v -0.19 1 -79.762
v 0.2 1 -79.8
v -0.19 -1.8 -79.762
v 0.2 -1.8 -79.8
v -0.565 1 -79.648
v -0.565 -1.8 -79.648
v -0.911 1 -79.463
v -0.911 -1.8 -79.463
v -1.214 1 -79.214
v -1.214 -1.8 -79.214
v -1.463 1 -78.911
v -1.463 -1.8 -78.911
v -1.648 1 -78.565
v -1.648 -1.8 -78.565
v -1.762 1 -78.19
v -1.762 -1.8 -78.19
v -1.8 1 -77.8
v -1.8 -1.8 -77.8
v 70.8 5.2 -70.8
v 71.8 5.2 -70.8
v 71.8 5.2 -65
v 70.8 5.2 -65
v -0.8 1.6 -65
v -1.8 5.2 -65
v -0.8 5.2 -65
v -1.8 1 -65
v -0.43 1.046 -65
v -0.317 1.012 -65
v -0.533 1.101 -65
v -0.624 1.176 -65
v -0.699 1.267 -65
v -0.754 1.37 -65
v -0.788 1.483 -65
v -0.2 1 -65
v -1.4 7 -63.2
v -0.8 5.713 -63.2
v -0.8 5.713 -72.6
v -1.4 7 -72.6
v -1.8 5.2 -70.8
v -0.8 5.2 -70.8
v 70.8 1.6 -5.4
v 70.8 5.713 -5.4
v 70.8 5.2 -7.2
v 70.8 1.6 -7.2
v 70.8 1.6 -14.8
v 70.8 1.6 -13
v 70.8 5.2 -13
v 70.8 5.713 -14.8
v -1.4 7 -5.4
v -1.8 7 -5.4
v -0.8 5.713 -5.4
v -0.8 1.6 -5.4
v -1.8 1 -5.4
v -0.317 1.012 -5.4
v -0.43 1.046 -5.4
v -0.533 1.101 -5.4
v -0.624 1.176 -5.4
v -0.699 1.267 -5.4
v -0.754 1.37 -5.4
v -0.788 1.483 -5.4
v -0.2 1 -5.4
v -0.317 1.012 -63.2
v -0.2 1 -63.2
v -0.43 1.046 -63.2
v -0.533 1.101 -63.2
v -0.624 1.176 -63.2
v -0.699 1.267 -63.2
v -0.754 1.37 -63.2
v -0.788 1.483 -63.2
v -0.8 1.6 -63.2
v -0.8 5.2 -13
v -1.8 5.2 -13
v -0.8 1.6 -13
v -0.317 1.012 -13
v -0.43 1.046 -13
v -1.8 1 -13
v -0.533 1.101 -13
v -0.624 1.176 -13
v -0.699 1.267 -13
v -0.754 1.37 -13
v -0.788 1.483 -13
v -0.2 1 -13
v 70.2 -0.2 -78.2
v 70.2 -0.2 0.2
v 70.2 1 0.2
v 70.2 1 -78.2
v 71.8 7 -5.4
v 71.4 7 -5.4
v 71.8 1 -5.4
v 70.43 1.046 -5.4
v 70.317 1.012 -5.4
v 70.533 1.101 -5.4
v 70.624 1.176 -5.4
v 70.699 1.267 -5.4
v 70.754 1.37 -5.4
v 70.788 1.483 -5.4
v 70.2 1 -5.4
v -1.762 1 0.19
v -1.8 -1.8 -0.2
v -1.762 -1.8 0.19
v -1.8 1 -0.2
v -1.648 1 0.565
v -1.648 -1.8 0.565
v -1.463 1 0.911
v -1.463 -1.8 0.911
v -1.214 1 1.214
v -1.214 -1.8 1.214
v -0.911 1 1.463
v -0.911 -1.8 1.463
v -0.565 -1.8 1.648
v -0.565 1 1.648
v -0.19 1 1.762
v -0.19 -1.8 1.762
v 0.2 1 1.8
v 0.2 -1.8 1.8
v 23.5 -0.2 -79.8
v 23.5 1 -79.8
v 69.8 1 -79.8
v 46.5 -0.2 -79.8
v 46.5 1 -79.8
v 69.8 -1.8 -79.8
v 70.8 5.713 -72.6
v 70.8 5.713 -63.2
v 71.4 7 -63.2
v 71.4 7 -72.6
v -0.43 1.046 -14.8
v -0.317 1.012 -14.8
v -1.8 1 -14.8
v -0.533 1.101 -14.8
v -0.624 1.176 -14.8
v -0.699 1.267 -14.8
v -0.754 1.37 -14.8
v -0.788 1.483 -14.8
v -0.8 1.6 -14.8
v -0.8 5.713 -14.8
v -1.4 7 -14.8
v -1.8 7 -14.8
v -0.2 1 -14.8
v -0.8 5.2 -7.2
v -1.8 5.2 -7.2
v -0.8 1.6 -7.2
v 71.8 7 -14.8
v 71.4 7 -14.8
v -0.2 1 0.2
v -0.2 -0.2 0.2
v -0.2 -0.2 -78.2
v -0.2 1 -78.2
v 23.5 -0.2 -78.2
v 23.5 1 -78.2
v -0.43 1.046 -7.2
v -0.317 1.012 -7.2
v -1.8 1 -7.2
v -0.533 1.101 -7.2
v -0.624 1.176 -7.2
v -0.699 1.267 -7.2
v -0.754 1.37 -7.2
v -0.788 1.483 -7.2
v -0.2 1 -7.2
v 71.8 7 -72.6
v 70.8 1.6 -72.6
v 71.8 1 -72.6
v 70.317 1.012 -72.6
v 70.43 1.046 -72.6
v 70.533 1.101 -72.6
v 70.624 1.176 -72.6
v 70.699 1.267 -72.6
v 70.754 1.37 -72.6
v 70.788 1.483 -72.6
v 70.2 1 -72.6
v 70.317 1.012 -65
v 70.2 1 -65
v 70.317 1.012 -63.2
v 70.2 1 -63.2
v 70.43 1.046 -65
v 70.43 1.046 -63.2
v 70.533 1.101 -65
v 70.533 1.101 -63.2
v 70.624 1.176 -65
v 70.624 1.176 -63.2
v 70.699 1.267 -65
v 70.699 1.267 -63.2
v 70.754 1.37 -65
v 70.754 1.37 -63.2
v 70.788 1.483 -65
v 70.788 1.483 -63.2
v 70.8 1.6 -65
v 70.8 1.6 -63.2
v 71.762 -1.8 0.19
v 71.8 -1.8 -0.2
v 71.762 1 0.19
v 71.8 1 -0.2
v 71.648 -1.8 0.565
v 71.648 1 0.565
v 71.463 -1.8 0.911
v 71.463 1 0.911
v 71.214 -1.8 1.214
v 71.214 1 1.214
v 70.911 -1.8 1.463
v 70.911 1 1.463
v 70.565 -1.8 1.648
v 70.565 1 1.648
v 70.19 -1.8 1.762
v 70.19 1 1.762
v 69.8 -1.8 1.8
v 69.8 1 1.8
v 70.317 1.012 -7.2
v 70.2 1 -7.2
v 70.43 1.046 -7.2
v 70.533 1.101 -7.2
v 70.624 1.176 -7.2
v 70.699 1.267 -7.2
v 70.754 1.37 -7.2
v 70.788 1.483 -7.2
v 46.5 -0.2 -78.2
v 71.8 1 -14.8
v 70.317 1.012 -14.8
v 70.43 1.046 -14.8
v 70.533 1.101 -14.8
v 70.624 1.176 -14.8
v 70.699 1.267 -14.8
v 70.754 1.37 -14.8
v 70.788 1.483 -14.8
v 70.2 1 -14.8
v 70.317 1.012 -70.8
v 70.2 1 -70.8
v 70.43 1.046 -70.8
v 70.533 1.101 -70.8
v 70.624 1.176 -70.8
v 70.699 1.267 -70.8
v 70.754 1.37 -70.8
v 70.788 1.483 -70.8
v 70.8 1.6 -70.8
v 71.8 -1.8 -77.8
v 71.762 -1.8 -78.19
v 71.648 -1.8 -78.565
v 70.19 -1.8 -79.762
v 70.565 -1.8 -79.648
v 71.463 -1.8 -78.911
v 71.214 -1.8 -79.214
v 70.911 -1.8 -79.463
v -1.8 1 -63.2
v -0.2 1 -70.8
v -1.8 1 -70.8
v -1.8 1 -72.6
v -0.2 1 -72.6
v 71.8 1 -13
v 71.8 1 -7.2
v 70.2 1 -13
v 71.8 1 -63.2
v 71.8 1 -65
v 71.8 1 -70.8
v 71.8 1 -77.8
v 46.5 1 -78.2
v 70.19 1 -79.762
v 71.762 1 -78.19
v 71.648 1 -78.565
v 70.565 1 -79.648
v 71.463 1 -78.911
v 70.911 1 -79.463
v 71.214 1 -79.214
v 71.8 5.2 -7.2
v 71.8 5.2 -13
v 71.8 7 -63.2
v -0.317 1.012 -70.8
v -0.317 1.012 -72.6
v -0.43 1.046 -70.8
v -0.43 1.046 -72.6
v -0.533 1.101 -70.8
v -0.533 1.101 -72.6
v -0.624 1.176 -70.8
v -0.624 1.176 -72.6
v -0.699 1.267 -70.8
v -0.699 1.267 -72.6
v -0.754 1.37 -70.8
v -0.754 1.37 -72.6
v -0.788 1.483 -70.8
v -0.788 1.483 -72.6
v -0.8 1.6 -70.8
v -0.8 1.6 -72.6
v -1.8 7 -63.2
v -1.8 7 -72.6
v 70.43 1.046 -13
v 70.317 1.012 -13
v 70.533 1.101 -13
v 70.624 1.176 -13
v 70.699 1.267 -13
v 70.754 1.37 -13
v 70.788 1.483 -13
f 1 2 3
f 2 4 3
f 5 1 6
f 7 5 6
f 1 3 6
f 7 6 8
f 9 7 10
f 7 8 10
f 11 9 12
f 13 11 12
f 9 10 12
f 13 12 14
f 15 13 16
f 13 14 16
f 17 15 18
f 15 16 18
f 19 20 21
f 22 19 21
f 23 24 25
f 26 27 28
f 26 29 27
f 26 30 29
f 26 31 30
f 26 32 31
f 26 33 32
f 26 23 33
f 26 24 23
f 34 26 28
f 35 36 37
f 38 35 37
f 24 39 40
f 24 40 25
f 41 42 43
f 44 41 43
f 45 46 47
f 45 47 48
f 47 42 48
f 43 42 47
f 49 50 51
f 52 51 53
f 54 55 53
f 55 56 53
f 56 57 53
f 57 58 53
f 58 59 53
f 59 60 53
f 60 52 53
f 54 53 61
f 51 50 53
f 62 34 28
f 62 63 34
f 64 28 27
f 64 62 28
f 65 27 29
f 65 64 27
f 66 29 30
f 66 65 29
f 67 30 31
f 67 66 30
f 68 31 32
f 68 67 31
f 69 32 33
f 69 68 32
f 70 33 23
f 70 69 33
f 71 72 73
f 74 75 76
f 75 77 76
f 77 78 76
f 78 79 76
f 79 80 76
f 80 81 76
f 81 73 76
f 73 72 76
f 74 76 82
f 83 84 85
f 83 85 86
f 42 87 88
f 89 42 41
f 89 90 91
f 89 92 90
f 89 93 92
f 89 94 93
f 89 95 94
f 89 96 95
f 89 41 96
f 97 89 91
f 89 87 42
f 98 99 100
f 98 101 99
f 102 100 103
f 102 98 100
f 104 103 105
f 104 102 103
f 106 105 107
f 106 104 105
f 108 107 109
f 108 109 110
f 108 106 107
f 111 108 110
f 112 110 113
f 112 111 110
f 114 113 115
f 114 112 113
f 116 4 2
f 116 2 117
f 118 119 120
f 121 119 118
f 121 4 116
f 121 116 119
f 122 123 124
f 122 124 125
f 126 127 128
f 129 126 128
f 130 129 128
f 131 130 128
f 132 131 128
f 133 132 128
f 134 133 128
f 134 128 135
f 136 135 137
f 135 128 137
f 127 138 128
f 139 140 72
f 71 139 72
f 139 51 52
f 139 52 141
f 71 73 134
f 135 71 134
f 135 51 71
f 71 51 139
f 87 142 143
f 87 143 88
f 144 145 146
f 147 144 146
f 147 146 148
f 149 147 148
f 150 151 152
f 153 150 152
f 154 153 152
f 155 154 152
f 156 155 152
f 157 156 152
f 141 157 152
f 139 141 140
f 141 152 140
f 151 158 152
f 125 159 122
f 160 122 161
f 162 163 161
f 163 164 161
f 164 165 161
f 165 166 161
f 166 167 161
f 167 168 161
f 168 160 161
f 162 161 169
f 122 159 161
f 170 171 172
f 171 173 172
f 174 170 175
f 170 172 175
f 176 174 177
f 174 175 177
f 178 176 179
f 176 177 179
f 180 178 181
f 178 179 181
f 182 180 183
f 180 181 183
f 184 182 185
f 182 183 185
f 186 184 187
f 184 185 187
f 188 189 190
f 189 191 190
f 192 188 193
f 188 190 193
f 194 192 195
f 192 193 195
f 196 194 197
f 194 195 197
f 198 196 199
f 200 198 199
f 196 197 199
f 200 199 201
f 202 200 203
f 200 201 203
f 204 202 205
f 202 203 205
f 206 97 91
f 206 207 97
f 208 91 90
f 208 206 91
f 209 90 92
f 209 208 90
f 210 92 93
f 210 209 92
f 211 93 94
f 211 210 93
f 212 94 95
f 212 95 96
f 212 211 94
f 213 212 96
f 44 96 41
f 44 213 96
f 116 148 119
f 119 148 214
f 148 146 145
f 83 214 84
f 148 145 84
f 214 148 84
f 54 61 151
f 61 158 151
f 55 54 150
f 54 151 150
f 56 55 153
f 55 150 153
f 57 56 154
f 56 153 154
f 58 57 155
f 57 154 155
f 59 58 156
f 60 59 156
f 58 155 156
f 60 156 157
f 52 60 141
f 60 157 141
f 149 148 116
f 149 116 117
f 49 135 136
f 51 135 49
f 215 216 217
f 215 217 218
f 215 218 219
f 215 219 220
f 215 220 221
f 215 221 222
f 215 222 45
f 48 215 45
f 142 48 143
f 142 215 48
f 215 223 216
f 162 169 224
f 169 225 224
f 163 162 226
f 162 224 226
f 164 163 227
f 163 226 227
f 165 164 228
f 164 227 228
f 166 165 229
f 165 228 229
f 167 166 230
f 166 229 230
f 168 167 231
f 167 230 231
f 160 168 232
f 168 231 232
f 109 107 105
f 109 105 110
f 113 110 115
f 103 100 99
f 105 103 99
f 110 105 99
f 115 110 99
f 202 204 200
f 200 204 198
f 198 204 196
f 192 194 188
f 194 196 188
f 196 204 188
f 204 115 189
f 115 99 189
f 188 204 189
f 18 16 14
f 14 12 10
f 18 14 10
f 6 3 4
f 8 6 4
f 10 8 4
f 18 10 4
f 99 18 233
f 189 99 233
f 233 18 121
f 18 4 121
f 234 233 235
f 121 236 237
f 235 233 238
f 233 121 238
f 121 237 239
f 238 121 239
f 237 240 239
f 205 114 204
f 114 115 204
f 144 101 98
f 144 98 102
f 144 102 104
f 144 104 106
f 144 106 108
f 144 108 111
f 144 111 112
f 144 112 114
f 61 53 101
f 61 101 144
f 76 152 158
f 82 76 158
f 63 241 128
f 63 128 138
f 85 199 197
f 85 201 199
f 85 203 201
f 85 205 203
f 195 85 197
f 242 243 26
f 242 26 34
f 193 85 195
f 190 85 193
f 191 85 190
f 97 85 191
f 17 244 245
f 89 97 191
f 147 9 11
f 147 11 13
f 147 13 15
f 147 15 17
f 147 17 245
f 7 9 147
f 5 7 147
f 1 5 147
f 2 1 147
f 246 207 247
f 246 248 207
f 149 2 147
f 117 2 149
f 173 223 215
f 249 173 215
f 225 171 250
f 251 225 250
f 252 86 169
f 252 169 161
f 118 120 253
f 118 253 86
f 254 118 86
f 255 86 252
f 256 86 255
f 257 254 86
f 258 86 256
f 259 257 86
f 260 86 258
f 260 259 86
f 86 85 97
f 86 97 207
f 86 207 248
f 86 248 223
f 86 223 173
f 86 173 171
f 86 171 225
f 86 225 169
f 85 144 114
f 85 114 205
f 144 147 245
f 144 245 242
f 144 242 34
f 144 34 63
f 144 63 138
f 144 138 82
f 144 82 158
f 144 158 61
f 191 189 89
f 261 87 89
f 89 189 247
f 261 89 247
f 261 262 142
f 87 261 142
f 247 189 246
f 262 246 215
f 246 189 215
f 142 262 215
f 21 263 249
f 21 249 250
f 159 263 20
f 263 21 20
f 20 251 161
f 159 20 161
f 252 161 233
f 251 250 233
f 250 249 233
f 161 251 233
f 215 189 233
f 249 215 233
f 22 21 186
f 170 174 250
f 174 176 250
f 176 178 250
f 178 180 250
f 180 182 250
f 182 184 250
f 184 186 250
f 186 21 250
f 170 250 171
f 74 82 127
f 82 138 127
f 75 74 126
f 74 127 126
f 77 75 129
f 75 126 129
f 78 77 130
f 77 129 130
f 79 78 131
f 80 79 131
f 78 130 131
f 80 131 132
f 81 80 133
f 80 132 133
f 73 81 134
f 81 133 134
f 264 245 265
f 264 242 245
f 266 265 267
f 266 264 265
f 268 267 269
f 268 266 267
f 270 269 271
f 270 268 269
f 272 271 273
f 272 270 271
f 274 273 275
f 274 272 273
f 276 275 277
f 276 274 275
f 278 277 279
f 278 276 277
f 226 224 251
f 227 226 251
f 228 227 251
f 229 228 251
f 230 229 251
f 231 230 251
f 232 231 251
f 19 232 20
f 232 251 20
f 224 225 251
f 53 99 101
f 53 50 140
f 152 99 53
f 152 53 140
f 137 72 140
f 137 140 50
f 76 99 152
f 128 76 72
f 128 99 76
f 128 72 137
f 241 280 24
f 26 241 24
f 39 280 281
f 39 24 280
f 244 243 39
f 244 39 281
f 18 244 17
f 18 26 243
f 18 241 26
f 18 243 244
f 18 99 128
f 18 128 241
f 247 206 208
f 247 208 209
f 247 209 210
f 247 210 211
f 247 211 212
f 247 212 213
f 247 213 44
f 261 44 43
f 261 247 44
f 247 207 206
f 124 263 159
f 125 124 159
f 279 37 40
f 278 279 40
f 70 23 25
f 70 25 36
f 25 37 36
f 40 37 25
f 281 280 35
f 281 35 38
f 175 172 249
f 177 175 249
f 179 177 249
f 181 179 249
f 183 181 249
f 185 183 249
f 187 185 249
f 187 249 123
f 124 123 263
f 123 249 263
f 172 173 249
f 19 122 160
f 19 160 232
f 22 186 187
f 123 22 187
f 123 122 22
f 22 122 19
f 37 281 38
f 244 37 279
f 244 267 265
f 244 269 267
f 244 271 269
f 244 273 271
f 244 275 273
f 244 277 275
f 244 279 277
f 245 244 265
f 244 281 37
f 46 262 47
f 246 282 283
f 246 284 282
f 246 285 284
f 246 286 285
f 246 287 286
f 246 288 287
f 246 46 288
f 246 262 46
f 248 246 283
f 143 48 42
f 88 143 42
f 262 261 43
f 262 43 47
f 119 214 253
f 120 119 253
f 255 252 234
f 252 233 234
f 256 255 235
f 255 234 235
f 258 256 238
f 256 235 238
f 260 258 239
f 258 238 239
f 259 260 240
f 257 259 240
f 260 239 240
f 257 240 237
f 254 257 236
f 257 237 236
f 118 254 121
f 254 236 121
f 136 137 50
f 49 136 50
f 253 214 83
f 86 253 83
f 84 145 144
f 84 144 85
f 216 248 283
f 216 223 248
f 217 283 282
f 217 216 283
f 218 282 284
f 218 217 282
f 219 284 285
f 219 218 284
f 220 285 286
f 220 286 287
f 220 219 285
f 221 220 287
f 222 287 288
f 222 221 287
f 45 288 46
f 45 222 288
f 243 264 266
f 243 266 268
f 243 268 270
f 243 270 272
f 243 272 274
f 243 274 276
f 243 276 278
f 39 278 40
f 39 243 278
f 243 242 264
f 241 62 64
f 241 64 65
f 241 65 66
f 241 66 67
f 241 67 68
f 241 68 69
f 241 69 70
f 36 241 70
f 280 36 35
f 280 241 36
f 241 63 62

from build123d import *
from OCP.BRepFilletAPI import BRepFilletAPI_MakeChamfer

# Parameters (mm, degrees)
SKIZZE1_W                       = 73.6
SKIZZE1_H                       = 81.6
AUFSATZ_LINEAR_AUSTRAGEN1_DEPTH = 1.6
SKIZZE2_W                       = 73.6
SKIZZE2_H                       = 81.6
SKIZZE2_W_2                     = 70.4
SKIZZE2_H_2                     = 78.4
AUFSATZ_LINEAR_AUSTRAGEN2_DEPTH = 1.2
SKIZZE3_W                       = 23
SKIZZE3_H                       = 4
SCHNITT_LINEAR_AUSTRAGEN1_DEPTH = 1.6
AUFSATZ_LINEAR_AUSTRAGEN3_DEPTH = 1
VERRUNDUNG1_R                   = 0.6
FASE1_SIZE                      = 0.6
FASE1_SIZE2                     = 1.286704152
VERRUNDUNG2_R                   = 2


with BuildPart() as part:
    # Skizze1 → Aufsatz-Linear austragen1 (new body)
    with BuildSketch(Plane(origin=(0, -0.2, 0), x_dir=(1, 0, 0), z_dir=(0, 1, 0))):
        with Locations((35, 39)):
            Rectangle(SKIZZE1_W, SKIZZE1_H)
    extrude(amount=-AUFSATZ_LINEAR_AUSTRAGEN1_DEPTH)

    # Skizze2 → Aufsatz-Linear austragen2 (add)
    with BuildSketch(Plane(origin=(0, -0.2, 0), x_dir=(1, 0, 0), z_dir=(0, 1, 0))):
        with Locations((35, 39)):
            Rectangle(SKIZZE2_W, SKIZZE2_H)
        with Locations((35, 39)):
            Rectangle(SKIZZE2_W_2, SKIZZE2_H_2, mode=Mode.SUBTRACT)
    extrude(amount=AUFSATZ_LINEAR_AUSTRAGEN2_DEPTH)

    # Skizze3 → Schnitt-Linear austragen1 (cut)
    with BuildSketch(Plane.XY.offset(-78.2)):
        with Locations((35, 1.8)):
            Rectangle(SKIZZE3_W, SKIZZE3_H)
    extrude(amount=-SCHNITT_LINEAR_AUSTRAGEN1_DEPTH, mode=Mode.SUBTRACT)

    # Skizze4 → Aufsatz-Linear austragen3 (add)
    with BuildSketch(Plane(origin=(-1.8, 0, 0), x_dir=(0, 0, -1), z_dir=(1, 0, 0))):
        Polygon((63.2, 0), (63.2, 7), (72.6, 7), (72.6, 0), (70.8, 0), (70.8, 5.2), (65, 5.2), (65, 0), align=None)
        Polygon((14.8, 7), (5.4, 7), (5.4, 0), (7.2, 0), (7.2, 5.2), (13, 5.2), (13, 0), (14.8, 0), align=None)
    aufsatz_linear_austragen3 = extrude(amount=AUFSATZ_LINEAR_AUSTRAGEN3_DEPTH)

    # Spiegeln1: Aufsatz-Linear austragen3 across plane
    add(aufsatz_linear_austragen3.mirror(Plane(origin=(35, 0, 0), x_dir=(0, 0, 1), z_dir=(1, 0, 0))))

    # Verrundung1
    verrundung1_edges = [part.edges().sort_by_distance(p)[0] for p in [
        (70.8, 1, -64.1),
        (70.8, 1, -71.7),
        (70.8, 1, -13.9),
        (70.8, 1, -6.3),
        (-0.8, 1, -71.7),
        (-0.8, 1, -64.1),
        (-0.8, 1, -6.3),
        (-0.8, 1, -13.9),
    ]]
    fillet(verrundung1_edges, radius=VERRUNDUNG1_R - 0.0001)  # a hair under: the kernel refuses the full size

    # Fase1: one chamfer whose edges measure the first distance from different faces: ONE call of the kernel's chamfer builder (chamfer() names one face for all edges)
    fase1_edges_1 = [part.edges().sort_by_distance(p)[0] for p in [
        (70.8, 7, -67.9),
    ]]
    fase1_side_1 = [part.faces().sort_by_distance(p)[0] for p in [
        (71.3, 7, -67.9),
    ]]
    fase1_edges_2 = [part.edges().sort_by_distance(p)[0] for p in [
        (70.8, 7, -10.1),
    ]]
    fase1_side_2 = [part.faces().sort_by_distance(p)[0] for p in [
        (71.3, 7, -10.1),
    ]]
    fase1_edges_3 = [part.edges().sort_by_distance(p)[0] for p in [
        (-0.8, 7, -67.9),
    ]]
    fase1_side_3 = [part.faces().sort_by_distance(p)[0] for p in [
        (-1.3, 7, -67.9),
    ]]
    fase1_edges_4 = [part.edges().sort_by_distance(p)[0] for p in [
        (-0.8, 7, -10.1),
    ]]
    fase1_side_4 = [part.faces().sort_by_distance(p)[0] for p in [
        (-1.3, 7, -10.1),
    ]]
    fase1 = BRepFilletAPI_MakeChamfer(part.part.solid().wrapped)
    for e in fase1_edges_1:
        fase1.Add(FASE1_SIZE, FASE1_SIZE2, e.wrapped, fase1_side_1[0].wrapped)  # the first distance lies on this face
    for e in fase1_edges_2:
        fase1.Add(FASE1_SIZE, FASE1_SIZE2, e.wrapped, fase1_side_2[0].wrapped)  # the first distance lies on this face
    for e in fase1_edges_3:
        fase1.Add(FASE1_SIZE, FASE1_SIZE2, e.wrapped, fase1_side_3[0].wrapped)  # the first distance lies on this face
    for e in fase1_edges_4:
        fase1.Add(FASE1_SIZE, FASE1_SIZE2, e.wrapped, fase1_side_4[0].wrapped)  # the first distance lies on this face
    add(Compound.cast(fase1.Shape()), mode=Mode.REPLACE)

    # Verrundung2
    verrundung2_edges = [part.edges().sort_by_distance(p)[0] for p in [
        (-1.8, -0.4, -79.8),
        (71.8, -0.4, -79.8),
        (71.8, -0.4, 1.8),
        (-1.8, -0.4, 1.8),
    ]]
    fillet(verrundung2_edges, radius=VERRUNDUNG2_R)


solid = part.part
